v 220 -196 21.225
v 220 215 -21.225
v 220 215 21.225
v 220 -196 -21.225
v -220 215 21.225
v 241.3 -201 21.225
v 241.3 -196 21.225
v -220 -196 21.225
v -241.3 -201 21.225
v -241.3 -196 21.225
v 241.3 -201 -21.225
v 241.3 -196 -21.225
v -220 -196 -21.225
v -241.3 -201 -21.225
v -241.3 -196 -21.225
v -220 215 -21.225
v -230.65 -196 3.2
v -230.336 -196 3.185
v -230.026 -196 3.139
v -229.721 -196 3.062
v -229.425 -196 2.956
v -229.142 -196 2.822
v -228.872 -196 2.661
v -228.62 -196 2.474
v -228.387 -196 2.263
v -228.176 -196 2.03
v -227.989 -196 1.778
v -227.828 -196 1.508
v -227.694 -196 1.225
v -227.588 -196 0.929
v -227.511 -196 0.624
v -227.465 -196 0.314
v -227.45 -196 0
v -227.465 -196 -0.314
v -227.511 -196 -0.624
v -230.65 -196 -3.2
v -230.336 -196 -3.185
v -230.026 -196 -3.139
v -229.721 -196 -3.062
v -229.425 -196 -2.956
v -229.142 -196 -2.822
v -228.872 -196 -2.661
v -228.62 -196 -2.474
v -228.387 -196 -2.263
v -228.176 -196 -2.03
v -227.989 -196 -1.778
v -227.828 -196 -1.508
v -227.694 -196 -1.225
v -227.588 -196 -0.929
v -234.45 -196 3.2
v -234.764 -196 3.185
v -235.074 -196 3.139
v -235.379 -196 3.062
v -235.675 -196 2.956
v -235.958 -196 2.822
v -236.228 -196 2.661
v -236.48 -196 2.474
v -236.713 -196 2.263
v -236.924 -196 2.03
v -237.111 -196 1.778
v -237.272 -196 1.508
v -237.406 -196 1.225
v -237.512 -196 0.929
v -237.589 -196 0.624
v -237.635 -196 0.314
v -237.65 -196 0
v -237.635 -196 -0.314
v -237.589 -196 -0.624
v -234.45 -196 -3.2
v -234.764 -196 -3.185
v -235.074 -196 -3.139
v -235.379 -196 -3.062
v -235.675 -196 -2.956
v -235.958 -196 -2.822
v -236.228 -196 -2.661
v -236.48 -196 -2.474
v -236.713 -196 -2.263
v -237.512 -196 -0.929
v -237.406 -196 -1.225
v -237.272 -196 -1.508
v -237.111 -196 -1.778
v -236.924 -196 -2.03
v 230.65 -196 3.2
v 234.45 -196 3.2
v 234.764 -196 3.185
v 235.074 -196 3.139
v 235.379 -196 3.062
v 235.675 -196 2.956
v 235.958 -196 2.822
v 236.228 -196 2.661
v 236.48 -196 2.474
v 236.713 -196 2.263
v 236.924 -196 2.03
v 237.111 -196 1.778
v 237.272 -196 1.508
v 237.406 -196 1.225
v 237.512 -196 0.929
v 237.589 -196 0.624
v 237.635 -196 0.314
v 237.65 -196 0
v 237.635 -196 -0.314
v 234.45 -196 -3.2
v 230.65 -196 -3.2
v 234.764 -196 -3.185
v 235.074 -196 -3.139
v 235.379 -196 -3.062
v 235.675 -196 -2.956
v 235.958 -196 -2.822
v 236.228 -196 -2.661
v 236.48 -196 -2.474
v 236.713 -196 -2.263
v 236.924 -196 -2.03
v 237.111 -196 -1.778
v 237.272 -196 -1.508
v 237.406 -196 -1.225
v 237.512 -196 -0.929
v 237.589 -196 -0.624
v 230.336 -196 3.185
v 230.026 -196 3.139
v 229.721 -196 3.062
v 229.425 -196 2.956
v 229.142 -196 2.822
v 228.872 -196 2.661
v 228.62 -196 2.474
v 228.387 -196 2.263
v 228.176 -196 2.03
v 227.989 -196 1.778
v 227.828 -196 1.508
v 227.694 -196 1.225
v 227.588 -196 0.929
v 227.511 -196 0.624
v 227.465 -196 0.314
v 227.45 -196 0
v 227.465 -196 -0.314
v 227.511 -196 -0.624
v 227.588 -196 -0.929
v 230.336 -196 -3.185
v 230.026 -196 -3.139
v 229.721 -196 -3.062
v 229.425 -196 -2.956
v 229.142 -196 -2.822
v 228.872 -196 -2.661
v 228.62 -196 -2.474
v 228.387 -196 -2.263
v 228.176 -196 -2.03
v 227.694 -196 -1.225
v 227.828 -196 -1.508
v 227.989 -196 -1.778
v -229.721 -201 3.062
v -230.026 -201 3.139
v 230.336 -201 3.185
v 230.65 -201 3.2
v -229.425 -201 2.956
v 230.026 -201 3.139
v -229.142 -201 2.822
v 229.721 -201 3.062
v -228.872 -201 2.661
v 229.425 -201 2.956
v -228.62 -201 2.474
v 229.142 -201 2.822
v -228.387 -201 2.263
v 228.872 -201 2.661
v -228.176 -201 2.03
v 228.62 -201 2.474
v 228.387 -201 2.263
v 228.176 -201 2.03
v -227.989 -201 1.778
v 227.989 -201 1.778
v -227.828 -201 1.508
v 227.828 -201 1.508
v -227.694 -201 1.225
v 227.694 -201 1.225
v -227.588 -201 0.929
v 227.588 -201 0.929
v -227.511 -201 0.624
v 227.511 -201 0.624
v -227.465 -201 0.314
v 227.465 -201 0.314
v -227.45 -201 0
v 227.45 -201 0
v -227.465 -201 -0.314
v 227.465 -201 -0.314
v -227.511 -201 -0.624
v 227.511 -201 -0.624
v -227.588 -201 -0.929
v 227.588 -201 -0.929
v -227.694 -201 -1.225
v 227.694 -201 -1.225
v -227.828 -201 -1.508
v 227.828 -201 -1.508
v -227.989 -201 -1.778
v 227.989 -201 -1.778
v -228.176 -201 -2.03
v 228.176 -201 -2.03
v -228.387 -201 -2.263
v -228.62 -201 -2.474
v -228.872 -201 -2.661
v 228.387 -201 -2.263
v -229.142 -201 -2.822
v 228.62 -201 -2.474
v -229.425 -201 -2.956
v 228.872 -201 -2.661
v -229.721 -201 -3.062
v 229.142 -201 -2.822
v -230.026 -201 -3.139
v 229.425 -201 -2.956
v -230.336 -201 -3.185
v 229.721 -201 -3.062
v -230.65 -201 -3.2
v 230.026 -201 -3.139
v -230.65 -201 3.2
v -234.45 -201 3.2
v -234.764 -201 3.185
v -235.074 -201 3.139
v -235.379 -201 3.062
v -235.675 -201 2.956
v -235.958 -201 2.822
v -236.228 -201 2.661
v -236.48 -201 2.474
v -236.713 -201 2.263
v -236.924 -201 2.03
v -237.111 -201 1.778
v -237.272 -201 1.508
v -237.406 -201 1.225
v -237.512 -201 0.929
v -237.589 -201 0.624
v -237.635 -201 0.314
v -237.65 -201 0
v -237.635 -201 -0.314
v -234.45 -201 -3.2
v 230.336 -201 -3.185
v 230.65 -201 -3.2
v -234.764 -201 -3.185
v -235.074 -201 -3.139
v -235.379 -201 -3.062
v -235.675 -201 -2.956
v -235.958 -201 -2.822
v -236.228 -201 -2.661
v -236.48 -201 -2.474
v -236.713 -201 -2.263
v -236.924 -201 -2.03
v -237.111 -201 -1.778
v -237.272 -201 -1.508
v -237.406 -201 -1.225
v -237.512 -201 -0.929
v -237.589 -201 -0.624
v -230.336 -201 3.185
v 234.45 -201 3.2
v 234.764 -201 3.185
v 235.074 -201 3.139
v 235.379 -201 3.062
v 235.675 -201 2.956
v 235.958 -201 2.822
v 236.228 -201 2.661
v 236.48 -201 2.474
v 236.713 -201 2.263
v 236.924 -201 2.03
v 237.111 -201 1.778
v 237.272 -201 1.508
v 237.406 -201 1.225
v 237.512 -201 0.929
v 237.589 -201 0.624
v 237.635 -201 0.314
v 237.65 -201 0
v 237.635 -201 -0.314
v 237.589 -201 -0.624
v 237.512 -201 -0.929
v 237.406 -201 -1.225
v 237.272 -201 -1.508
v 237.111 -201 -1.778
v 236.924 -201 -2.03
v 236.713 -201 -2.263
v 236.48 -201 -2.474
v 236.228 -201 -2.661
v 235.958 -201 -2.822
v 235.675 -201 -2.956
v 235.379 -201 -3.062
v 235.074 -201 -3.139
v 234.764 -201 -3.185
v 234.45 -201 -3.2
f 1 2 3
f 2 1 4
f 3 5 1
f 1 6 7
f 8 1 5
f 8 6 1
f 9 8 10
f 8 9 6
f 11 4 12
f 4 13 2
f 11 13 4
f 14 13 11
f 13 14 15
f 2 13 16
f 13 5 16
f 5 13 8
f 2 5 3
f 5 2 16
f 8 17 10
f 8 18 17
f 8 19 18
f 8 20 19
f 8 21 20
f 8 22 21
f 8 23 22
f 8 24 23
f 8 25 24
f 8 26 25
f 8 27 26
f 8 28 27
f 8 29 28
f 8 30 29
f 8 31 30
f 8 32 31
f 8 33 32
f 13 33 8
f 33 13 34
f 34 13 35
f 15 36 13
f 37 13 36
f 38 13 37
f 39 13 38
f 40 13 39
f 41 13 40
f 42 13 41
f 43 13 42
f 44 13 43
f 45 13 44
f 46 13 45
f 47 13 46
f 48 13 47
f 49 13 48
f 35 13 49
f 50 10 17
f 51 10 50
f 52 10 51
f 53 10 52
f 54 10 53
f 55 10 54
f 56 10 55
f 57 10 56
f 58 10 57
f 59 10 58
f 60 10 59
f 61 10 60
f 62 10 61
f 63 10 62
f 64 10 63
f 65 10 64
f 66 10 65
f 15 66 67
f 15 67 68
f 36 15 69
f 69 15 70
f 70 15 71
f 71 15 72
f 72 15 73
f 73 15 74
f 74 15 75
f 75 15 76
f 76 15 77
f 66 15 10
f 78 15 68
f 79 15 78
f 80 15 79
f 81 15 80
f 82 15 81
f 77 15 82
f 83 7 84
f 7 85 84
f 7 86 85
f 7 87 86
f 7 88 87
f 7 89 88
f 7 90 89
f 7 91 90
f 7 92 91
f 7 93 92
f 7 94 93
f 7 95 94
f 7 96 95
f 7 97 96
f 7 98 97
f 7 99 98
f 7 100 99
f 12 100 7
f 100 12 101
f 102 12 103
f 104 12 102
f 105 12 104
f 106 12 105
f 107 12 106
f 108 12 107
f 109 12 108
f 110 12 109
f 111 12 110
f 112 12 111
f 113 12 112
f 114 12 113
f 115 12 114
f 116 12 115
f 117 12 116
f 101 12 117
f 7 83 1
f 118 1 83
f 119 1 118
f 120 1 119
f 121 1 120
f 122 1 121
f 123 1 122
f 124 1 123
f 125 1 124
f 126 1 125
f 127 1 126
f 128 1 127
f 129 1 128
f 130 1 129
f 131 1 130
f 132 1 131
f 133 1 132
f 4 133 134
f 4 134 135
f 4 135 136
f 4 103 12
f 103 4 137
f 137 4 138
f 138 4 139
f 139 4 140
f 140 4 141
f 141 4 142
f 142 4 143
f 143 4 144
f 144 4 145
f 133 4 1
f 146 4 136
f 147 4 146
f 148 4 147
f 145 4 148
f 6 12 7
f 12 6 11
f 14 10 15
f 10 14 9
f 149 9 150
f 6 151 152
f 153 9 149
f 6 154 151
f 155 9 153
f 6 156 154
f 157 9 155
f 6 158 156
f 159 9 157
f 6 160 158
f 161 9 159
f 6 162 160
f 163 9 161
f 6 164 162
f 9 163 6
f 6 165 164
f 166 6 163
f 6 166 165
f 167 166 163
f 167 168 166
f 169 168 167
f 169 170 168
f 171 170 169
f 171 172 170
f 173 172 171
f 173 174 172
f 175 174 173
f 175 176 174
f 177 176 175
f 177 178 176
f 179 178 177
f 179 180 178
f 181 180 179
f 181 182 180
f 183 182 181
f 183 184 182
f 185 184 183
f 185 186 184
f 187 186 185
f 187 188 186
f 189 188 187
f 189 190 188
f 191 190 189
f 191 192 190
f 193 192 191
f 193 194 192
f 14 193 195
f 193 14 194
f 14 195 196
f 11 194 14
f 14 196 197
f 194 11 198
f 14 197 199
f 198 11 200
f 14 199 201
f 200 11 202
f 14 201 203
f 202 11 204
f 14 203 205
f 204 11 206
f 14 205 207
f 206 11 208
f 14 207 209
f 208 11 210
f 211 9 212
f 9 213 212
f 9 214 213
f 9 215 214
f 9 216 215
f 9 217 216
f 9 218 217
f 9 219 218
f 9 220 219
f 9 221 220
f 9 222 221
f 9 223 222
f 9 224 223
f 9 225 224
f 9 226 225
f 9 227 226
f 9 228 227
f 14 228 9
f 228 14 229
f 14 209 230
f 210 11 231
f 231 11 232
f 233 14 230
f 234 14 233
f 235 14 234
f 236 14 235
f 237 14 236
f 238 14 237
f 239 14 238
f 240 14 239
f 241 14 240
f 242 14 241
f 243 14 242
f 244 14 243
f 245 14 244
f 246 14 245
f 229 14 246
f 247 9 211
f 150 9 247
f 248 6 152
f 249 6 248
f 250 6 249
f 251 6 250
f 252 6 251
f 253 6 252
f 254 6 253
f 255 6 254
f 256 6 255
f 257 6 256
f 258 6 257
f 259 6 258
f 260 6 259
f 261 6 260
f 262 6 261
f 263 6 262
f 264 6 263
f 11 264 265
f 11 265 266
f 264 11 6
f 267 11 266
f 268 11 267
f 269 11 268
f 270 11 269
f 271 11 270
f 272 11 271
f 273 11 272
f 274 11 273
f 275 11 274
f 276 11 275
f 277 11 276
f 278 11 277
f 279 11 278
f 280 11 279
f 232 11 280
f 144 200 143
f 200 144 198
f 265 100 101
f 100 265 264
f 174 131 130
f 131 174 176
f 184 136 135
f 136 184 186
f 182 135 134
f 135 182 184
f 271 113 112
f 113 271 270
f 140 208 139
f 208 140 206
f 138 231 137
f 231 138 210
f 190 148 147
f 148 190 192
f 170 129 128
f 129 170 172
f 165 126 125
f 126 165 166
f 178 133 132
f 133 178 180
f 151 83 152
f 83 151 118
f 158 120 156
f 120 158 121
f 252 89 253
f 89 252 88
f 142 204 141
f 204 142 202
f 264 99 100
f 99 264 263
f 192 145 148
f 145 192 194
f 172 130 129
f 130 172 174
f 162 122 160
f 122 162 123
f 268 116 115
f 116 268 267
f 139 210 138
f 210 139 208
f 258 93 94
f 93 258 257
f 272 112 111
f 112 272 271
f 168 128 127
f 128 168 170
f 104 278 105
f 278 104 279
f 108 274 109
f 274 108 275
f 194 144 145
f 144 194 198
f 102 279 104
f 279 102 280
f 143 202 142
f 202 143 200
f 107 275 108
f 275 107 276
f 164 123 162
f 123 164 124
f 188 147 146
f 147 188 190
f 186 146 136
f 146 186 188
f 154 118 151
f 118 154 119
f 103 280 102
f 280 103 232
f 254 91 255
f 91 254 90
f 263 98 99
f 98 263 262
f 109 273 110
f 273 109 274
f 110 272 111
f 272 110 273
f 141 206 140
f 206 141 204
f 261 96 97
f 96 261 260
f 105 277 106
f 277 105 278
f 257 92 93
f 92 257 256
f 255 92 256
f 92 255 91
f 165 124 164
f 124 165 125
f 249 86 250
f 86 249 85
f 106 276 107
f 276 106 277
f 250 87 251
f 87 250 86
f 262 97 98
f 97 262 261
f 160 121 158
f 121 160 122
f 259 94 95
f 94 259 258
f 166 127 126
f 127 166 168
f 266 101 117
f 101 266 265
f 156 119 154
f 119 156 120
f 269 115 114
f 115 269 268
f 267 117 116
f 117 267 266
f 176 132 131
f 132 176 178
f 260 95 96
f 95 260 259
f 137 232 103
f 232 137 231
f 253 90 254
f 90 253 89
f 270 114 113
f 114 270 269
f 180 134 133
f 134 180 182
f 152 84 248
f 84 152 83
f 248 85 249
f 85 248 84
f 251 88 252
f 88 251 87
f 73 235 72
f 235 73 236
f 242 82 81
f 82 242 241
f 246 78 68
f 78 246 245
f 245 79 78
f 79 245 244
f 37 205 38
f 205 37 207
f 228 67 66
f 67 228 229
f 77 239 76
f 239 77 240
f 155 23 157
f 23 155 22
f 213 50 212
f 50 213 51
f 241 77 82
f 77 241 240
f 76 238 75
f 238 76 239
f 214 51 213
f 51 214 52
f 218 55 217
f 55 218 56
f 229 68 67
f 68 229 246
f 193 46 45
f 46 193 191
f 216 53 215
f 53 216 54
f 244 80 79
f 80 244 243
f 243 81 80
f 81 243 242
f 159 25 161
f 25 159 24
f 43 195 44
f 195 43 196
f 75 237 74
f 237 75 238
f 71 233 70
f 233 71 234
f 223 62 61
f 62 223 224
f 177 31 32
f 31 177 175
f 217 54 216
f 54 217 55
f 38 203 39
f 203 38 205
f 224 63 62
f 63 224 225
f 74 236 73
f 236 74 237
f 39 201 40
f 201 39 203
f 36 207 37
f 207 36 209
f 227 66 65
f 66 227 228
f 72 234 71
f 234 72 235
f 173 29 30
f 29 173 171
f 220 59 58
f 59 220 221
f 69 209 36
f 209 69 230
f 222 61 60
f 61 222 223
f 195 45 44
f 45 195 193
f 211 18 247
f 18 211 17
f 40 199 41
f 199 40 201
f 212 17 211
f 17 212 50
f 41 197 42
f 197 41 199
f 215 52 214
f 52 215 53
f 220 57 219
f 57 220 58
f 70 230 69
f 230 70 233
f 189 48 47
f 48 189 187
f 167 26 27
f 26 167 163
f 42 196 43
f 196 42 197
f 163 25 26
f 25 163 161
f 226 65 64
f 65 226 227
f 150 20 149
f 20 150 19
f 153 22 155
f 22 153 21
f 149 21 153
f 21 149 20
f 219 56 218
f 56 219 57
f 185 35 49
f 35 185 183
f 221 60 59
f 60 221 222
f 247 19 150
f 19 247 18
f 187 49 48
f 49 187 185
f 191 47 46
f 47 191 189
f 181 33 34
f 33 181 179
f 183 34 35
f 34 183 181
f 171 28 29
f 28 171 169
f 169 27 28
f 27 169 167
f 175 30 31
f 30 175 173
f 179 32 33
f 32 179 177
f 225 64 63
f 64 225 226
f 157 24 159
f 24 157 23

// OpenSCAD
// ============================================================================
// Atom Lithography Machine — Parametric OpenSCAD Module (S1.5-03)
// ============================================================================
// part_id           : S1.5-03
// parent_bom_id     : S1.5
// subsystem         : S1
// part_name         : Enerji suzgeci ultra-dusuk gurultulu cift-kutuplu besleme
// material          : Al 6061
// temp_stage        : 300 K (kabin)
// vacuum_grade      : Atmosfer
// tolerance         : ±50 mV
// computed_mass_kg  : 5.35001
// envelope_mm       : 482.600 x 442.500 x 42.450
// design_maturity   : M0_M1_DETAILED_CAD_DESIGN_ONLY
// no_lab_measurement: true
// iec61508_certified: false
// semi_s2_certified : false
// Units: millimeters (mm)
// ============================================================================

$fn = 64;

// Nominal bounding envelope parameters (mm)
bbox_x = 482.6000;
bbox_y = 442.5000;
bbox_z = 42.4500;

// Part-specific parametric dimensions
rack_u = 1;
u_slot = "U31";
ripple_mVpp = 50.0;
stability_ppm = 10.0;

// Interface / port parameters (mm)
port_hda_hemi_bias_out_od = 14.000;

module part_S1_5_03() {
  difference() {
    union() {
      // 1U hollow 19-in chassis body (width along X)
      translate([0.000, 9.500, 0.000]) cube([440.000, 411.000, 42.450], center=true);
      // EIA-310 19-in front panel w/ mounting ears facing -Y
      translate([0.000, -198.500, 0.000]) cube([482.600, 5.000, 42.450], center=true);
    }
    // EIA-310 +X rack slot
    translate([232.550, -198.500, 0.000]) rotate([90.000, 0.000, 0.000]) {
      hull() {
        translate([-1.900, 0, 0]) cylinder(d=6.400, h=9.000, center=true);
        translate([1.900, 0, 0]) cylinder(d=6.400, h=9.000, center=true);
      }
    }
    // EIA-310 -X rack slot
    translate([-232.550, -198.500, 0.000]) rotate([90.000, 0.000, 0.000]) {
      hull() {
        translate([-1.900, 0, 0]) cylinder(d=6.400, h=9.000, center=true);
        translate([1.900, 0, 0]) cylinder(d=6.400, h=9.000, center=true);
      }
    }
  }
}

// World assembly mounting transform (global machine frame, mm / deg):
// translate([1480.000, -223.000, 945.725]) rotate([0.000, 0.000, 0.000]) part_S1_5_03();

part_S1_5_03();
